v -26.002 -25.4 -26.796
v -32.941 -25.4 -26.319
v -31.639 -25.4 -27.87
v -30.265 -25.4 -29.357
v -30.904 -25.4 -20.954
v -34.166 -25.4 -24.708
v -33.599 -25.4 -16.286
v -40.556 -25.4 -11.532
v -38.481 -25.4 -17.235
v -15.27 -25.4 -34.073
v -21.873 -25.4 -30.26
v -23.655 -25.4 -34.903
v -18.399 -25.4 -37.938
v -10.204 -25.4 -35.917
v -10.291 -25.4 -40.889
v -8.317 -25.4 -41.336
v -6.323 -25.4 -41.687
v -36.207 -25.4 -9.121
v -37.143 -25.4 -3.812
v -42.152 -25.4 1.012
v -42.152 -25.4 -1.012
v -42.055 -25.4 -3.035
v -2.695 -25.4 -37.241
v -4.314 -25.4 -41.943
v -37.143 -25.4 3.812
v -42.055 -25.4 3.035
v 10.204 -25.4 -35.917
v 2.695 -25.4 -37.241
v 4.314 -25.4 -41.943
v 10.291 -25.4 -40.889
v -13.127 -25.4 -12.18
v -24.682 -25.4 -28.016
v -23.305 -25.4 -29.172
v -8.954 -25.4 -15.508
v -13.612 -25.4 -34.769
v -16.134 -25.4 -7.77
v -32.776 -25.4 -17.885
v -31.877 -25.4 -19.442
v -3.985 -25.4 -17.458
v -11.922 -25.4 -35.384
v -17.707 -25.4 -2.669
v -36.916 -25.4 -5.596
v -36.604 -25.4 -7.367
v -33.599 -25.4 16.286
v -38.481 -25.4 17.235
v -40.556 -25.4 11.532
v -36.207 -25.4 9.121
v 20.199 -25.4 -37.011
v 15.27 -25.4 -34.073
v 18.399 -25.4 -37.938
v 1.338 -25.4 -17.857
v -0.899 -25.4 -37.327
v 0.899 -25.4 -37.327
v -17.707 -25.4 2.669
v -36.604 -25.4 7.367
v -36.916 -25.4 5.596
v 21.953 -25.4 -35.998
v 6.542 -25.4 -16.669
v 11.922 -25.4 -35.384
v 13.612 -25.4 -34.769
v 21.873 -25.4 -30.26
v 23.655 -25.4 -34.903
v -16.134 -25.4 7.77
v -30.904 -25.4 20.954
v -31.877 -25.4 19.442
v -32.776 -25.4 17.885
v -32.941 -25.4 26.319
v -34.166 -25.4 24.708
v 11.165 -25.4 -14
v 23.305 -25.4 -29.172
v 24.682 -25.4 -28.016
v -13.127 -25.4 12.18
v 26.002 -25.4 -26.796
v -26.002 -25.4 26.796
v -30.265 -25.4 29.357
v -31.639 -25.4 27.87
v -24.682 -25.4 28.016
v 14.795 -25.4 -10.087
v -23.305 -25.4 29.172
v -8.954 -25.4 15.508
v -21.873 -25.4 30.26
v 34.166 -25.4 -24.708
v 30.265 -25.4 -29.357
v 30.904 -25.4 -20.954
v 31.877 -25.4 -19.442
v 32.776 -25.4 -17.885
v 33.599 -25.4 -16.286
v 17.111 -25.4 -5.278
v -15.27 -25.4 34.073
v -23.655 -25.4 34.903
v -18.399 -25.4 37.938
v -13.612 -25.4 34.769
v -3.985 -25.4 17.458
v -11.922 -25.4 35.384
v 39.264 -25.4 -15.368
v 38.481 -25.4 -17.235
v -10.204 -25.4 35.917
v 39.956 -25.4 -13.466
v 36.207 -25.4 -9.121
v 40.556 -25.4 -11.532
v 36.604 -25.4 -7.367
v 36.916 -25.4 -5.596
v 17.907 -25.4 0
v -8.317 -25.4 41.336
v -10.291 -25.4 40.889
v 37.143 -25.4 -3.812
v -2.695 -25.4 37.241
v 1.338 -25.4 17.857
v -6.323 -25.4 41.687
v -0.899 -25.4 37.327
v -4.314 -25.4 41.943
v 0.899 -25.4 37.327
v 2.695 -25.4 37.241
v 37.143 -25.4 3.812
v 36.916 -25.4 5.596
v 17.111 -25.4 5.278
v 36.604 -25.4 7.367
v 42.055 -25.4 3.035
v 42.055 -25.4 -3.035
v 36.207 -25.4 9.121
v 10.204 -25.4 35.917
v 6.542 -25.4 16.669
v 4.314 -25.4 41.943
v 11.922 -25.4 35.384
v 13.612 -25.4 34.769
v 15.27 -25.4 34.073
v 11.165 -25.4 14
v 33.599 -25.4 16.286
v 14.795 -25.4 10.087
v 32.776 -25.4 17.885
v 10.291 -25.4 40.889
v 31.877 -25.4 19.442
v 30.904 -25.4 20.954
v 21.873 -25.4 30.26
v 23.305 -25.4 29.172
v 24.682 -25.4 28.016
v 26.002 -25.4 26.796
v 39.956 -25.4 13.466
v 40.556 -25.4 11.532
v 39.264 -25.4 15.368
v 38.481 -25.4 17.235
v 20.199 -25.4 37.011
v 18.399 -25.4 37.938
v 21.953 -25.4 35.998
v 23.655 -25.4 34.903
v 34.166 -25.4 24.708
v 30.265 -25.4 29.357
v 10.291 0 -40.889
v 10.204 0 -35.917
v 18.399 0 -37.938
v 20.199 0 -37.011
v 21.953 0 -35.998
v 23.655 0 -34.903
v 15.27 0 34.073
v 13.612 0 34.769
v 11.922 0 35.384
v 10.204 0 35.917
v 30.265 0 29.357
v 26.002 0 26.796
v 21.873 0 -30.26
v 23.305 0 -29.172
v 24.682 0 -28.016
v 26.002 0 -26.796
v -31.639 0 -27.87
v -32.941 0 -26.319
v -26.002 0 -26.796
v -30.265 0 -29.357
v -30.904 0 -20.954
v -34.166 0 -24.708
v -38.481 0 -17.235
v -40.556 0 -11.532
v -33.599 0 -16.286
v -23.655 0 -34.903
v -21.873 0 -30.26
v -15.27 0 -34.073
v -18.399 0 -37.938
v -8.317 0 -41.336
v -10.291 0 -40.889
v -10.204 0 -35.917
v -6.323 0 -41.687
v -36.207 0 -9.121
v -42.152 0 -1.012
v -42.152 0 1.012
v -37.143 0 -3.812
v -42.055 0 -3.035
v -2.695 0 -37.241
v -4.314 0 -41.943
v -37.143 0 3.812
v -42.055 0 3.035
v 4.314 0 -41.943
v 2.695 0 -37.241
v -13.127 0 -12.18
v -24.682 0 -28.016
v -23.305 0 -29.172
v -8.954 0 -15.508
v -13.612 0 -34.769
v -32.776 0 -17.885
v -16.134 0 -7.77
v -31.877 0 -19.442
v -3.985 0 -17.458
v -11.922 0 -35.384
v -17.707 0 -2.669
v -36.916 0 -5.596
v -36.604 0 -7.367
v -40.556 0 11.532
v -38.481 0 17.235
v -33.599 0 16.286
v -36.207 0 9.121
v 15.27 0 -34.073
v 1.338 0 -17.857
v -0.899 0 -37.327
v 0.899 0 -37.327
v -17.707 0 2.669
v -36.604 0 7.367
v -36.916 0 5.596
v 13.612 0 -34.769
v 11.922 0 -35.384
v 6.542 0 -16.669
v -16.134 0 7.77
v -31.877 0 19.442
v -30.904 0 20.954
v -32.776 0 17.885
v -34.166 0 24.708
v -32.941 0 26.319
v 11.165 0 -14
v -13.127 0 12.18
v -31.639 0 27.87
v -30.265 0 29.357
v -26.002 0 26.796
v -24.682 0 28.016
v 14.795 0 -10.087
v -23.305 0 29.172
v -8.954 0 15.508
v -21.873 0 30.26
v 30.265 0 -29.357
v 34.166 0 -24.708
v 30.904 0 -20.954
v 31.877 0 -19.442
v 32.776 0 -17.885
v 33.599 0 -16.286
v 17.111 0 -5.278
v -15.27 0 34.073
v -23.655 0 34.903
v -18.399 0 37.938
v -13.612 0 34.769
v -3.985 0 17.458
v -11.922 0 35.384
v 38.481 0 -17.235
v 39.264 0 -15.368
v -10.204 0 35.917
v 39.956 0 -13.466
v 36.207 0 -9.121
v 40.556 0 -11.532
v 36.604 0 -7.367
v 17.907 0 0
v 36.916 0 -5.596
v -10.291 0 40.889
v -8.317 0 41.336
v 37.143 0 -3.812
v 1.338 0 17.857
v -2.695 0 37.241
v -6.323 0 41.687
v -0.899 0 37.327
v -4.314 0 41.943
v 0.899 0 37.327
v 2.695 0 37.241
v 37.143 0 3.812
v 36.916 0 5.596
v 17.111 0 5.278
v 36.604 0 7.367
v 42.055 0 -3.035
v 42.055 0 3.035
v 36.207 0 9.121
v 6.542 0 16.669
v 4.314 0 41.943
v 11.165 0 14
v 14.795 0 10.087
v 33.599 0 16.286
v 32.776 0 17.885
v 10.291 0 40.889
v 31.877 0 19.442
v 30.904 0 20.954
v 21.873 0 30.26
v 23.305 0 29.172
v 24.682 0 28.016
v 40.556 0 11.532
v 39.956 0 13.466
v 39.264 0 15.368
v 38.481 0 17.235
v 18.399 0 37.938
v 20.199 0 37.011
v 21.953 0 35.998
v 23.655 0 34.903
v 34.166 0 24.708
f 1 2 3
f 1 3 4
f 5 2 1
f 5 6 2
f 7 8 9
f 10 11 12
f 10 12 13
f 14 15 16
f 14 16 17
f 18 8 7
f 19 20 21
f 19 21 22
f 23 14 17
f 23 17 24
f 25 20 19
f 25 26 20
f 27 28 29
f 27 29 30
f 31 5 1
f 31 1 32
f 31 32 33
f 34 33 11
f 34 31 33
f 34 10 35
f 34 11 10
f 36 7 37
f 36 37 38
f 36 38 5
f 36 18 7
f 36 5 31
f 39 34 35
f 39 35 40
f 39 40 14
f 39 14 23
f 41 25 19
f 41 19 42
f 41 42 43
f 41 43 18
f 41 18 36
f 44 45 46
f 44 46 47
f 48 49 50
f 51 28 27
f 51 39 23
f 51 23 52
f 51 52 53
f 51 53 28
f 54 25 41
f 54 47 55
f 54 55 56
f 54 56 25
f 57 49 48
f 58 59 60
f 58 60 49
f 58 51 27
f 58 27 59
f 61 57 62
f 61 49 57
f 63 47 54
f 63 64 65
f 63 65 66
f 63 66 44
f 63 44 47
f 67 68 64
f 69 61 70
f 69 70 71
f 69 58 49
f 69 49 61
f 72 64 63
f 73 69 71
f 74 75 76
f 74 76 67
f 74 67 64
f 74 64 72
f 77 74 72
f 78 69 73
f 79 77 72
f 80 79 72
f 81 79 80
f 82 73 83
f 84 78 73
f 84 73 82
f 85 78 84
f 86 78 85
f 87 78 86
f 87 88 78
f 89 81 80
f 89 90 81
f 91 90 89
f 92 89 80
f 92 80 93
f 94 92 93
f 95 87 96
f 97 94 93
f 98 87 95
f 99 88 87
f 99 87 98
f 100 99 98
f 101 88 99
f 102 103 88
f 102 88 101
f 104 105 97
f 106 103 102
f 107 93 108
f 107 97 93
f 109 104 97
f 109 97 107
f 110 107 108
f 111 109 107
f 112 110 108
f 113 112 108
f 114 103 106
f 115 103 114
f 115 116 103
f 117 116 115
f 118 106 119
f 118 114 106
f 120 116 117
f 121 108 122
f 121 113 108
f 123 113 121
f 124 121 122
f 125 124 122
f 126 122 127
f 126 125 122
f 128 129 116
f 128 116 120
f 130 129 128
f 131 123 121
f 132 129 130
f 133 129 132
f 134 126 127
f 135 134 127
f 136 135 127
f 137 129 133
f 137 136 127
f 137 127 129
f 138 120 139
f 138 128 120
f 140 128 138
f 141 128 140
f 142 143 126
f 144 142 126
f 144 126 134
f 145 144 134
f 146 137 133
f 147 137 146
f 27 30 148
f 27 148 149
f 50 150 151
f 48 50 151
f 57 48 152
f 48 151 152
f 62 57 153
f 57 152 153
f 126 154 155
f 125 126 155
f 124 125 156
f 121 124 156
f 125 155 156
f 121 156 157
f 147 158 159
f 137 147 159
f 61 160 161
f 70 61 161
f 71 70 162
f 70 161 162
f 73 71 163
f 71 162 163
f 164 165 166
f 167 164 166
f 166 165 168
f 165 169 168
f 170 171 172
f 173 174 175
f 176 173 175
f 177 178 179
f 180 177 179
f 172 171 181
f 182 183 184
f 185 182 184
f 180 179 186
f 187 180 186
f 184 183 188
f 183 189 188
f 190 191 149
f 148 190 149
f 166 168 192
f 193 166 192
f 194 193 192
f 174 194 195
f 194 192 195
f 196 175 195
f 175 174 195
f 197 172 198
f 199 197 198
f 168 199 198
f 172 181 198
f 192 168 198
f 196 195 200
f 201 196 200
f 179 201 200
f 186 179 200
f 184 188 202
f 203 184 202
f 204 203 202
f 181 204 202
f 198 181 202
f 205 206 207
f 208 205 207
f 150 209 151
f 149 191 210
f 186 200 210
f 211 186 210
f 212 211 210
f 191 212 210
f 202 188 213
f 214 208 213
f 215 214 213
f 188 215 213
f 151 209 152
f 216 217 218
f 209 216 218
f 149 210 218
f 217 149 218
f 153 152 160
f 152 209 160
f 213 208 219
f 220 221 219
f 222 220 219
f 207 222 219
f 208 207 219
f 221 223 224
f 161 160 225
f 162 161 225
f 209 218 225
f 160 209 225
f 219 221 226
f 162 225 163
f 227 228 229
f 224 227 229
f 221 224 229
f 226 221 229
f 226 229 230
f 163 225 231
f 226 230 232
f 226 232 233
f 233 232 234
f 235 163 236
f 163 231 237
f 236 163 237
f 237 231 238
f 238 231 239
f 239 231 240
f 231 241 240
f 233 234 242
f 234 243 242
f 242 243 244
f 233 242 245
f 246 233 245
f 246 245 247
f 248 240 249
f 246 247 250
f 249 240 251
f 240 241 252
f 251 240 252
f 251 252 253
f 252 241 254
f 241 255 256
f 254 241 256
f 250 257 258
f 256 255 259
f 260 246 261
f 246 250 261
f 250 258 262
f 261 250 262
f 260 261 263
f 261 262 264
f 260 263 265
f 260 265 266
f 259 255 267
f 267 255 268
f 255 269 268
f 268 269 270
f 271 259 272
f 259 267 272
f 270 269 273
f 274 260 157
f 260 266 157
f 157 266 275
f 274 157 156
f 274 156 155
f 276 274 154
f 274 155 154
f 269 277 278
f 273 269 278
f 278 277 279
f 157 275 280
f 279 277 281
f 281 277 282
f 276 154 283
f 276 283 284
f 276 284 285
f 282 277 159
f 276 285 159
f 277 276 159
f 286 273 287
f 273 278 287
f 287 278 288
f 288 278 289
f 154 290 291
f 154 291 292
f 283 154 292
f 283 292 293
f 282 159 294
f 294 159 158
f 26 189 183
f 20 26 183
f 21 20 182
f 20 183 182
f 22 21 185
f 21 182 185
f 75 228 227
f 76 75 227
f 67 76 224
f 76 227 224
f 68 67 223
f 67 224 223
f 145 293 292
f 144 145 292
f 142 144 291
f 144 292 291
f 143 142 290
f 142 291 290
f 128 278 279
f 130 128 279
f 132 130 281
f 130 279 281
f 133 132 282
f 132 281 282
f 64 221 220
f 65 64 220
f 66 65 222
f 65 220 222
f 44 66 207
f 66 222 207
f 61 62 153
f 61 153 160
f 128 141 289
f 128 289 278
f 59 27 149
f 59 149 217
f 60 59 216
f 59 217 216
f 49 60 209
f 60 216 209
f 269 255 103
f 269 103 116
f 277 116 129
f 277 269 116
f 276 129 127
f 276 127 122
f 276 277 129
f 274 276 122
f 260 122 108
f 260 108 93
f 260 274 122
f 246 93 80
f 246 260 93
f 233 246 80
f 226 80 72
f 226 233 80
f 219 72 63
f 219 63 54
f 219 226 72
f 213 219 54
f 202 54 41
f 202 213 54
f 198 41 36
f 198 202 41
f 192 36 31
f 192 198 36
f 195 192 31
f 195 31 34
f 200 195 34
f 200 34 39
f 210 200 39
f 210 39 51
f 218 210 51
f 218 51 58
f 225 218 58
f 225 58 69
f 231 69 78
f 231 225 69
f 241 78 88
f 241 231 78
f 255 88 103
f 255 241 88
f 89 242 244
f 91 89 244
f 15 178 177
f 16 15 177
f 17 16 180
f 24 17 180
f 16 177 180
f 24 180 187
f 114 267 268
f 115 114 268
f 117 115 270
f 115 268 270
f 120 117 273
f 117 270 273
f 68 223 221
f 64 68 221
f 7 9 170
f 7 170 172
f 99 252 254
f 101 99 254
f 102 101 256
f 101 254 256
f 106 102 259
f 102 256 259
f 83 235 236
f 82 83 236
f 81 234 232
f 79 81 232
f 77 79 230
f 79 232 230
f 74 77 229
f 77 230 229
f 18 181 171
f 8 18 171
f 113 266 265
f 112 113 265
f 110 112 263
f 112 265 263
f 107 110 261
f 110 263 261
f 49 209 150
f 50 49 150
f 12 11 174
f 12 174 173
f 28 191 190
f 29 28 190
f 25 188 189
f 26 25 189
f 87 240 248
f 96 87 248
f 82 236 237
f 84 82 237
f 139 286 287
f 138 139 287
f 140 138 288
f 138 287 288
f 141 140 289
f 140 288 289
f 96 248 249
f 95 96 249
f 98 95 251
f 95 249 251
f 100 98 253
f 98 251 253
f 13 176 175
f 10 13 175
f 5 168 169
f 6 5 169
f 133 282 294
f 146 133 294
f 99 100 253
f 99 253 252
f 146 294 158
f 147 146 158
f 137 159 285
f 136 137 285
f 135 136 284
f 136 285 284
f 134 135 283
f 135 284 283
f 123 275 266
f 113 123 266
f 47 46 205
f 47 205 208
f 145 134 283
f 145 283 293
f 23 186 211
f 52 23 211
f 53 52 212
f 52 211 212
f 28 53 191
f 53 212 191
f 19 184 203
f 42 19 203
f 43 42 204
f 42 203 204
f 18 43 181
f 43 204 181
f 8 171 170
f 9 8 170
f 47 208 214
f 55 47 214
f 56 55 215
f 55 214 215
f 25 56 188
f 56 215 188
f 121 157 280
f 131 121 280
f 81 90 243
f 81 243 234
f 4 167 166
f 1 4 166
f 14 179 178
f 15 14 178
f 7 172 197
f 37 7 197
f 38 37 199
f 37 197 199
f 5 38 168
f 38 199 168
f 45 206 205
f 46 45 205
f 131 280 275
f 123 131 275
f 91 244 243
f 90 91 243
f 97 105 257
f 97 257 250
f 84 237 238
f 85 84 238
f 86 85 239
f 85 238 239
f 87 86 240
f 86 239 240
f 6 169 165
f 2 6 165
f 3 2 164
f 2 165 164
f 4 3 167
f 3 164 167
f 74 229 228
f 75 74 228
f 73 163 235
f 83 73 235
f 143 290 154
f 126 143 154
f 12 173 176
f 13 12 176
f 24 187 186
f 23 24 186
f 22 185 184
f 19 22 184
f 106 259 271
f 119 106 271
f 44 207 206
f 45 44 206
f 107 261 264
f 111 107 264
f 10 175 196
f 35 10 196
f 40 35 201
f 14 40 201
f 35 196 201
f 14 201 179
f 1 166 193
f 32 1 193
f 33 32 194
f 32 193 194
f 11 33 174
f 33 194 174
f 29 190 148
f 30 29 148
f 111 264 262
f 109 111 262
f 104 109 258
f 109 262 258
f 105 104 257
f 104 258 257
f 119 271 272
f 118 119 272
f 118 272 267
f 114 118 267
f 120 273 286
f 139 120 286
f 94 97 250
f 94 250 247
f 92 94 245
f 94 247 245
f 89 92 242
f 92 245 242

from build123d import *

# Parameters (mm, degrees)
F0_R     = 17.907
F1_DEPTH = 25.4


with BuildPart() as f1:
    # F0 (on Front) → F1 (new body)
    with BuildSketch(Plane.XZ):
        with BuildLine():
            Line((42.05466, 3.034541), (37.142847, 3.812496))
            ThreePointArc((37.142847, 3.812496), (36.770752, 6.483676), (36.20681, 9.121028))
            Line((36.20681, 9.121028), (40.556328, 11.532005))
            ThreePointArc((40.556328, 11.532005), (39.6212, 14.420937), (38.48058, 17.235077))
            Line((38.48058, 17.235077), (33.598909, 16.286176))
            ThreePointArc((33.598909, 16.286176), (32.335657, 18.669), (30.903697, 20.954421))
            Line((30.903697, 20.954421), (34.166304, 24.707621))
            Line((34.166304, 24.707621), (30.265173, 29.356808))
            Line((30.265173, 29.356808), (26.002447, 26.795504))
            ThreePointArc((26.002447, 26.795504), (24.000404, 28.602567), (21.873142, 30.260401))
            Line((21.873142, 30.260401), (23.65532, 34.903134))
            ThreePointArc((23.65532, 34.903134), (21.082, 36.515095), (18.39934, 37.937675))
            Line((18.39934, 37.937675), (15.269705, 34.072897))
            ThreePointArc((15.269705, 34.072897), (12.770348, 35.086243), (10.204363, 35.916531))
            Line((10.204363, 35.916531), (10.291155, 40.888813))
            Line((10.291155, 40.888813), (4.314275, 41.942698))
            Line((4.314275, 41.942698), (2.695212, 37.240597))
            ThreePointArc((2.695212, 37.240597), (0, 37.338), (-2.695212, 37.240597))
            Line((-2.695212, 37.240597), (-4.314275, 41.942698))
            ThreePointArc((-4.314275, 41.942698), (-7.321702, 41.523434), (-10.291155, 40.888813))
            Line((-10.291155, 40.888813), (-10.204363, 35.916531))
            ThreePointArc((-10.204363, 35.916531), (-12.770348, 35.086243), (-15.269705, 34.072897))
            Line((-15.269705, 34.072897), (-18.39934, 37.937675))
            Line((-18.39934, 37.937675), (-23.65532, 34.903134))
            Line((-23.65532, 34.903134), (-21.873142, 30.260401))
            ThreePointArc((-21.873142, 30.260401), (-24.000404, 28.602567), (-26.002447, 26.795504))
            Line((-26.002447, 26.795504), (-30.265173, 29.356808))
            ThreePointArc((-30.265173, 29.356808), (-32.299498, 27.102497), (-34.166304, 24.707621))
            Line((-34.166304, 24.707621), (-30.903697, 20.954421))
            ThreePointArc((-30.903697, 20.954421), (-32.335657, 18.669), (-33.598909, 16.286176))
            Line((-33.598909, 16.286176), (-38.48058, 17.235077))
            Line((-38.48058, 17.235077), (-40.556328, 11.532005))
            Line((-40.556328, 11.532005), (-36.20681, 9.121028))
            ThreePointArc((-36.20681, 9.121028), (-36.770752, 6.483676), (-37.142847, 3.812496))
            Line((-37.142847, 3.812496), (-42.05466, 3.034541))
            ThreePointArc((-42.05466, 3.034541), (-42.164, 0), (-42.05466, -3.034541))
            Line((-42.05466, -3.034541), (-37.142847, -3.812496))
            ThreePointArc((-37.142847, -3.812496), (-36.770752, -6.483676), (-36.20681, -9.121028))
            Line((-36.20681, -9.121028), (-40.556328, -11.532005))
            Line((-40.556328, -11.532005), (-38.48058, -17.235077))
            Line((-38.48058, -17.235077), (-33.598909, -16.286176))
            ThreePointArc((-33.598909, -16.286176), (-32.335657, -18.669), (-30.903697, -20.954421))
            Line((-30.903697, -20.954421), (-34.166304, -24.707621))
            ThreePointArc((-34.166304, -24.707621), (-32.299498, -27.102497), (-30.265173, -29.356808))
            Line((-30.265173, -29.356808), (-26.002447, -26.795504))
            ThreePointArc((-26.002447, -26.795504), (-24.000404, -28.602567), (-21.873142, -30.260401))
            Line((-21.873142, -30.260401), (-23.65532, -34.903134))
            Line((-23.65532, -34.903134), (-18.39934, -37.937675))
            Line((-18.39934, -37.937675), (-15.269705, -34.072897))
            ThreePointArc((-15.269705, -34.072897), (-12.770348, -35.086243), (-10.204363, -35.916531))
            Line((-10.204363, -35.916531), (-10.291155, -40.888813))
            ThreePointArc((-10.291155, -40.888813), (-7.321702, -41.523434), (-4.314275, -41.942698))
            Line((-4.314275, -41.942698), (-2.695212, -37.240597))
            ThreePointArc((-2.695212, -37.240597), (0, -37.338), (2.695212, -37.240597))
            Line((2.695212, -37.240597), (4.314275, -41.942698))
            Line((4.314275, -41.942698), (10.291155, -40.888813))
            Line((10.291155, -40.888813), (10.204363, -35.916531))
            ThreePointArc((10.204363, -35.916531), (12.770348, -35.086243), (15.269705, -34.072897))
            Line((15.269705, -34.072897), (18.39934, -37.937675))
            ThreePointArc((18.39934, -37.937675), (21.082, -36.515095), (23.65532, -34.903134))
            Line((23.65532, -34.903134), (21.873142, -30.260401))
            ThreePointArc((21.873142, -30.260401), (24.000404, -28.602567), (26.002447, -26.795504))
            Line((26.002447, -26.795504), (30.265173, -29.356808))
            Line((30.265173, -29.356808), (34.166304, -24.707621))
            Line((34.166304, -24.707621), (30.903697, -20.954421))
            ThreePointArc((30.903697, -20.954421), (32.335657, -18.669), (33.598909, -16.286176))
            Line((33.598909, -16.286176), (38.48058, -17.235077))
            ThreePointArc((38.48058, -17.235077), (39.6212, -14.420937), (40.556328, -11.532005))
            Line((40.556328, -11.532005), (36.20681, -9.121028))
            ThreePointArc((36.20681, -9.121028), (36.770752, -6.483676), (37.142847, -3.812496))
            Line((37.142847, -3.812496), (42.05466, -3.034541))
            Line((42.05466, -3.034541), (42.05466, 3.034541))
        make_face()
        Circle(F0_R, mode=Mode.SUBTRACT)
    extrude(amount=F1_DEPTH)


solid = f1.part
